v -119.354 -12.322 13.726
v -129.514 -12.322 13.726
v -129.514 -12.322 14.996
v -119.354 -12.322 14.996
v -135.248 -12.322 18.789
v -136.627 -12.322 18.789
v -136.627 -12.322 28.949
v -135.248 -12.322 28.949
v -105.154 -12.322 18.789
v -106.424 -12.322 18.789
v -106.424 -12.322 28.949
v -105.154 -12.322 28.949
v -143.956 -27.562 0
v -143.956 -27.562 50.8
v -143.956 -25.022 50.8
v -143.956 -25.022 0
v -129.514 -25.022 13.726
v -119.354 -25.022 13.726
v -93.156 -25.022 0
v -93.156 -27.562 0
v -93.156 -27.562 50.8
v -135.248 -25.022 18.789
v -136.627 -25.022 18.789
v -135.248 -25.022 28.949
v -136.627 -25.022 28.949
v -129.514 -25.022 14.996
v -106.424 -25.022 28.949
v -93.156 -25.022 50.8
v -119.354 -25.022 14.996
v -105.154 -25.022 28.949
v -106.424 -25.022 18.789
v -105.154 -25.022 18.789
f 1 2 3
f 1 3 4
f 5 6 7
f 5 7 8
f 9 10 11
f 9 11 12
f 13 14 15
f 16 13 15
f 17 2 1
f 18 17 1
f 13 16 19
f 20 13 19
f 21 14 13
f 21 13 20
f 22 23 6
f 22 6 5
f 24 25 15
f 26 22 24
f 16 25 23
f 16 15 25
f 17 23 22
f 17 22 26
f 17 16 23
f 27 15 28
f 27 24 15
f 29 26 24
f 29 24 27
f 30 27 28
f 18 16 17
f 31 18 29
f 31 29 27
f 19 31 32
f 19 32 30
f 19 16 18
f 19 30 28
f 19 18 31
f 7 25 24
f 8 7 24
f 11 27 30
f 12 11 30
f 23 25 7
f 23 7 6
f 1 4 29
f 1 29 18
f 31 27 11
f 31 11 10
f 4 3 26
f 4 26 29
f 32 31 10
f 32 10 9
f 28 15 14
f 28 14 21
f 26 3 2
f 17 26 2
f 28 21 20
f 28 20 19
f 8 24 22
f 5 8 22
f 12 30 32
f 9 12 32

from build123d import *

# Parameters (mm, degrees)
SKETCH1_W           = 50.8
SKETCH1_H           = 2.54
BOSS_EXTRUDE1_DEPTH = 50.8
SKETCH2_W           = 10.16
SKETCH2_H           = 1.27
SKETCH2_W_2         = 1.27
SKETCH2_H_2         = 10.16
SKETCH2_W_3         = 1.379502468
BOSS_EXTRUDE2_DEPTH = 12.7


with BuildPart() as part:
    # Sketch1 → Boss-Extrude1 (new body)
    with BuildSketch(Plane.XY):
        with Locations((-118.555926356, -26.291516762)):
            Rectangle(SKETCH1_W, SKETCH1_H)
    extrude(amount=BOSS_EXTRUDE1_DEPTH)

    # Sketch2 → Boss-Extrude2 (add)
    with BuildSketch(Plane(origin=(0, -25.021516762, 0), x_dir=(1, 0, 0), z_dir=(0, 1, 0))):
        with Locations((-124.433948154, -14.360513522)):
            Rectangle(SKETCH2_W, SKETCH2_H)
        with Locations((-105.788523286, -23.868729288)):
            Rectangle(SKETCH2_W_2, SKETCH2_H_2)
        with Locations((-135.937615572, -23.868729288)):
            Rectangle(SKETCH2_W_3, SKETCH2_H_2)
    extrude(amount=BOSS_EXTRUDE2_DEPTH)


solid = part.part
